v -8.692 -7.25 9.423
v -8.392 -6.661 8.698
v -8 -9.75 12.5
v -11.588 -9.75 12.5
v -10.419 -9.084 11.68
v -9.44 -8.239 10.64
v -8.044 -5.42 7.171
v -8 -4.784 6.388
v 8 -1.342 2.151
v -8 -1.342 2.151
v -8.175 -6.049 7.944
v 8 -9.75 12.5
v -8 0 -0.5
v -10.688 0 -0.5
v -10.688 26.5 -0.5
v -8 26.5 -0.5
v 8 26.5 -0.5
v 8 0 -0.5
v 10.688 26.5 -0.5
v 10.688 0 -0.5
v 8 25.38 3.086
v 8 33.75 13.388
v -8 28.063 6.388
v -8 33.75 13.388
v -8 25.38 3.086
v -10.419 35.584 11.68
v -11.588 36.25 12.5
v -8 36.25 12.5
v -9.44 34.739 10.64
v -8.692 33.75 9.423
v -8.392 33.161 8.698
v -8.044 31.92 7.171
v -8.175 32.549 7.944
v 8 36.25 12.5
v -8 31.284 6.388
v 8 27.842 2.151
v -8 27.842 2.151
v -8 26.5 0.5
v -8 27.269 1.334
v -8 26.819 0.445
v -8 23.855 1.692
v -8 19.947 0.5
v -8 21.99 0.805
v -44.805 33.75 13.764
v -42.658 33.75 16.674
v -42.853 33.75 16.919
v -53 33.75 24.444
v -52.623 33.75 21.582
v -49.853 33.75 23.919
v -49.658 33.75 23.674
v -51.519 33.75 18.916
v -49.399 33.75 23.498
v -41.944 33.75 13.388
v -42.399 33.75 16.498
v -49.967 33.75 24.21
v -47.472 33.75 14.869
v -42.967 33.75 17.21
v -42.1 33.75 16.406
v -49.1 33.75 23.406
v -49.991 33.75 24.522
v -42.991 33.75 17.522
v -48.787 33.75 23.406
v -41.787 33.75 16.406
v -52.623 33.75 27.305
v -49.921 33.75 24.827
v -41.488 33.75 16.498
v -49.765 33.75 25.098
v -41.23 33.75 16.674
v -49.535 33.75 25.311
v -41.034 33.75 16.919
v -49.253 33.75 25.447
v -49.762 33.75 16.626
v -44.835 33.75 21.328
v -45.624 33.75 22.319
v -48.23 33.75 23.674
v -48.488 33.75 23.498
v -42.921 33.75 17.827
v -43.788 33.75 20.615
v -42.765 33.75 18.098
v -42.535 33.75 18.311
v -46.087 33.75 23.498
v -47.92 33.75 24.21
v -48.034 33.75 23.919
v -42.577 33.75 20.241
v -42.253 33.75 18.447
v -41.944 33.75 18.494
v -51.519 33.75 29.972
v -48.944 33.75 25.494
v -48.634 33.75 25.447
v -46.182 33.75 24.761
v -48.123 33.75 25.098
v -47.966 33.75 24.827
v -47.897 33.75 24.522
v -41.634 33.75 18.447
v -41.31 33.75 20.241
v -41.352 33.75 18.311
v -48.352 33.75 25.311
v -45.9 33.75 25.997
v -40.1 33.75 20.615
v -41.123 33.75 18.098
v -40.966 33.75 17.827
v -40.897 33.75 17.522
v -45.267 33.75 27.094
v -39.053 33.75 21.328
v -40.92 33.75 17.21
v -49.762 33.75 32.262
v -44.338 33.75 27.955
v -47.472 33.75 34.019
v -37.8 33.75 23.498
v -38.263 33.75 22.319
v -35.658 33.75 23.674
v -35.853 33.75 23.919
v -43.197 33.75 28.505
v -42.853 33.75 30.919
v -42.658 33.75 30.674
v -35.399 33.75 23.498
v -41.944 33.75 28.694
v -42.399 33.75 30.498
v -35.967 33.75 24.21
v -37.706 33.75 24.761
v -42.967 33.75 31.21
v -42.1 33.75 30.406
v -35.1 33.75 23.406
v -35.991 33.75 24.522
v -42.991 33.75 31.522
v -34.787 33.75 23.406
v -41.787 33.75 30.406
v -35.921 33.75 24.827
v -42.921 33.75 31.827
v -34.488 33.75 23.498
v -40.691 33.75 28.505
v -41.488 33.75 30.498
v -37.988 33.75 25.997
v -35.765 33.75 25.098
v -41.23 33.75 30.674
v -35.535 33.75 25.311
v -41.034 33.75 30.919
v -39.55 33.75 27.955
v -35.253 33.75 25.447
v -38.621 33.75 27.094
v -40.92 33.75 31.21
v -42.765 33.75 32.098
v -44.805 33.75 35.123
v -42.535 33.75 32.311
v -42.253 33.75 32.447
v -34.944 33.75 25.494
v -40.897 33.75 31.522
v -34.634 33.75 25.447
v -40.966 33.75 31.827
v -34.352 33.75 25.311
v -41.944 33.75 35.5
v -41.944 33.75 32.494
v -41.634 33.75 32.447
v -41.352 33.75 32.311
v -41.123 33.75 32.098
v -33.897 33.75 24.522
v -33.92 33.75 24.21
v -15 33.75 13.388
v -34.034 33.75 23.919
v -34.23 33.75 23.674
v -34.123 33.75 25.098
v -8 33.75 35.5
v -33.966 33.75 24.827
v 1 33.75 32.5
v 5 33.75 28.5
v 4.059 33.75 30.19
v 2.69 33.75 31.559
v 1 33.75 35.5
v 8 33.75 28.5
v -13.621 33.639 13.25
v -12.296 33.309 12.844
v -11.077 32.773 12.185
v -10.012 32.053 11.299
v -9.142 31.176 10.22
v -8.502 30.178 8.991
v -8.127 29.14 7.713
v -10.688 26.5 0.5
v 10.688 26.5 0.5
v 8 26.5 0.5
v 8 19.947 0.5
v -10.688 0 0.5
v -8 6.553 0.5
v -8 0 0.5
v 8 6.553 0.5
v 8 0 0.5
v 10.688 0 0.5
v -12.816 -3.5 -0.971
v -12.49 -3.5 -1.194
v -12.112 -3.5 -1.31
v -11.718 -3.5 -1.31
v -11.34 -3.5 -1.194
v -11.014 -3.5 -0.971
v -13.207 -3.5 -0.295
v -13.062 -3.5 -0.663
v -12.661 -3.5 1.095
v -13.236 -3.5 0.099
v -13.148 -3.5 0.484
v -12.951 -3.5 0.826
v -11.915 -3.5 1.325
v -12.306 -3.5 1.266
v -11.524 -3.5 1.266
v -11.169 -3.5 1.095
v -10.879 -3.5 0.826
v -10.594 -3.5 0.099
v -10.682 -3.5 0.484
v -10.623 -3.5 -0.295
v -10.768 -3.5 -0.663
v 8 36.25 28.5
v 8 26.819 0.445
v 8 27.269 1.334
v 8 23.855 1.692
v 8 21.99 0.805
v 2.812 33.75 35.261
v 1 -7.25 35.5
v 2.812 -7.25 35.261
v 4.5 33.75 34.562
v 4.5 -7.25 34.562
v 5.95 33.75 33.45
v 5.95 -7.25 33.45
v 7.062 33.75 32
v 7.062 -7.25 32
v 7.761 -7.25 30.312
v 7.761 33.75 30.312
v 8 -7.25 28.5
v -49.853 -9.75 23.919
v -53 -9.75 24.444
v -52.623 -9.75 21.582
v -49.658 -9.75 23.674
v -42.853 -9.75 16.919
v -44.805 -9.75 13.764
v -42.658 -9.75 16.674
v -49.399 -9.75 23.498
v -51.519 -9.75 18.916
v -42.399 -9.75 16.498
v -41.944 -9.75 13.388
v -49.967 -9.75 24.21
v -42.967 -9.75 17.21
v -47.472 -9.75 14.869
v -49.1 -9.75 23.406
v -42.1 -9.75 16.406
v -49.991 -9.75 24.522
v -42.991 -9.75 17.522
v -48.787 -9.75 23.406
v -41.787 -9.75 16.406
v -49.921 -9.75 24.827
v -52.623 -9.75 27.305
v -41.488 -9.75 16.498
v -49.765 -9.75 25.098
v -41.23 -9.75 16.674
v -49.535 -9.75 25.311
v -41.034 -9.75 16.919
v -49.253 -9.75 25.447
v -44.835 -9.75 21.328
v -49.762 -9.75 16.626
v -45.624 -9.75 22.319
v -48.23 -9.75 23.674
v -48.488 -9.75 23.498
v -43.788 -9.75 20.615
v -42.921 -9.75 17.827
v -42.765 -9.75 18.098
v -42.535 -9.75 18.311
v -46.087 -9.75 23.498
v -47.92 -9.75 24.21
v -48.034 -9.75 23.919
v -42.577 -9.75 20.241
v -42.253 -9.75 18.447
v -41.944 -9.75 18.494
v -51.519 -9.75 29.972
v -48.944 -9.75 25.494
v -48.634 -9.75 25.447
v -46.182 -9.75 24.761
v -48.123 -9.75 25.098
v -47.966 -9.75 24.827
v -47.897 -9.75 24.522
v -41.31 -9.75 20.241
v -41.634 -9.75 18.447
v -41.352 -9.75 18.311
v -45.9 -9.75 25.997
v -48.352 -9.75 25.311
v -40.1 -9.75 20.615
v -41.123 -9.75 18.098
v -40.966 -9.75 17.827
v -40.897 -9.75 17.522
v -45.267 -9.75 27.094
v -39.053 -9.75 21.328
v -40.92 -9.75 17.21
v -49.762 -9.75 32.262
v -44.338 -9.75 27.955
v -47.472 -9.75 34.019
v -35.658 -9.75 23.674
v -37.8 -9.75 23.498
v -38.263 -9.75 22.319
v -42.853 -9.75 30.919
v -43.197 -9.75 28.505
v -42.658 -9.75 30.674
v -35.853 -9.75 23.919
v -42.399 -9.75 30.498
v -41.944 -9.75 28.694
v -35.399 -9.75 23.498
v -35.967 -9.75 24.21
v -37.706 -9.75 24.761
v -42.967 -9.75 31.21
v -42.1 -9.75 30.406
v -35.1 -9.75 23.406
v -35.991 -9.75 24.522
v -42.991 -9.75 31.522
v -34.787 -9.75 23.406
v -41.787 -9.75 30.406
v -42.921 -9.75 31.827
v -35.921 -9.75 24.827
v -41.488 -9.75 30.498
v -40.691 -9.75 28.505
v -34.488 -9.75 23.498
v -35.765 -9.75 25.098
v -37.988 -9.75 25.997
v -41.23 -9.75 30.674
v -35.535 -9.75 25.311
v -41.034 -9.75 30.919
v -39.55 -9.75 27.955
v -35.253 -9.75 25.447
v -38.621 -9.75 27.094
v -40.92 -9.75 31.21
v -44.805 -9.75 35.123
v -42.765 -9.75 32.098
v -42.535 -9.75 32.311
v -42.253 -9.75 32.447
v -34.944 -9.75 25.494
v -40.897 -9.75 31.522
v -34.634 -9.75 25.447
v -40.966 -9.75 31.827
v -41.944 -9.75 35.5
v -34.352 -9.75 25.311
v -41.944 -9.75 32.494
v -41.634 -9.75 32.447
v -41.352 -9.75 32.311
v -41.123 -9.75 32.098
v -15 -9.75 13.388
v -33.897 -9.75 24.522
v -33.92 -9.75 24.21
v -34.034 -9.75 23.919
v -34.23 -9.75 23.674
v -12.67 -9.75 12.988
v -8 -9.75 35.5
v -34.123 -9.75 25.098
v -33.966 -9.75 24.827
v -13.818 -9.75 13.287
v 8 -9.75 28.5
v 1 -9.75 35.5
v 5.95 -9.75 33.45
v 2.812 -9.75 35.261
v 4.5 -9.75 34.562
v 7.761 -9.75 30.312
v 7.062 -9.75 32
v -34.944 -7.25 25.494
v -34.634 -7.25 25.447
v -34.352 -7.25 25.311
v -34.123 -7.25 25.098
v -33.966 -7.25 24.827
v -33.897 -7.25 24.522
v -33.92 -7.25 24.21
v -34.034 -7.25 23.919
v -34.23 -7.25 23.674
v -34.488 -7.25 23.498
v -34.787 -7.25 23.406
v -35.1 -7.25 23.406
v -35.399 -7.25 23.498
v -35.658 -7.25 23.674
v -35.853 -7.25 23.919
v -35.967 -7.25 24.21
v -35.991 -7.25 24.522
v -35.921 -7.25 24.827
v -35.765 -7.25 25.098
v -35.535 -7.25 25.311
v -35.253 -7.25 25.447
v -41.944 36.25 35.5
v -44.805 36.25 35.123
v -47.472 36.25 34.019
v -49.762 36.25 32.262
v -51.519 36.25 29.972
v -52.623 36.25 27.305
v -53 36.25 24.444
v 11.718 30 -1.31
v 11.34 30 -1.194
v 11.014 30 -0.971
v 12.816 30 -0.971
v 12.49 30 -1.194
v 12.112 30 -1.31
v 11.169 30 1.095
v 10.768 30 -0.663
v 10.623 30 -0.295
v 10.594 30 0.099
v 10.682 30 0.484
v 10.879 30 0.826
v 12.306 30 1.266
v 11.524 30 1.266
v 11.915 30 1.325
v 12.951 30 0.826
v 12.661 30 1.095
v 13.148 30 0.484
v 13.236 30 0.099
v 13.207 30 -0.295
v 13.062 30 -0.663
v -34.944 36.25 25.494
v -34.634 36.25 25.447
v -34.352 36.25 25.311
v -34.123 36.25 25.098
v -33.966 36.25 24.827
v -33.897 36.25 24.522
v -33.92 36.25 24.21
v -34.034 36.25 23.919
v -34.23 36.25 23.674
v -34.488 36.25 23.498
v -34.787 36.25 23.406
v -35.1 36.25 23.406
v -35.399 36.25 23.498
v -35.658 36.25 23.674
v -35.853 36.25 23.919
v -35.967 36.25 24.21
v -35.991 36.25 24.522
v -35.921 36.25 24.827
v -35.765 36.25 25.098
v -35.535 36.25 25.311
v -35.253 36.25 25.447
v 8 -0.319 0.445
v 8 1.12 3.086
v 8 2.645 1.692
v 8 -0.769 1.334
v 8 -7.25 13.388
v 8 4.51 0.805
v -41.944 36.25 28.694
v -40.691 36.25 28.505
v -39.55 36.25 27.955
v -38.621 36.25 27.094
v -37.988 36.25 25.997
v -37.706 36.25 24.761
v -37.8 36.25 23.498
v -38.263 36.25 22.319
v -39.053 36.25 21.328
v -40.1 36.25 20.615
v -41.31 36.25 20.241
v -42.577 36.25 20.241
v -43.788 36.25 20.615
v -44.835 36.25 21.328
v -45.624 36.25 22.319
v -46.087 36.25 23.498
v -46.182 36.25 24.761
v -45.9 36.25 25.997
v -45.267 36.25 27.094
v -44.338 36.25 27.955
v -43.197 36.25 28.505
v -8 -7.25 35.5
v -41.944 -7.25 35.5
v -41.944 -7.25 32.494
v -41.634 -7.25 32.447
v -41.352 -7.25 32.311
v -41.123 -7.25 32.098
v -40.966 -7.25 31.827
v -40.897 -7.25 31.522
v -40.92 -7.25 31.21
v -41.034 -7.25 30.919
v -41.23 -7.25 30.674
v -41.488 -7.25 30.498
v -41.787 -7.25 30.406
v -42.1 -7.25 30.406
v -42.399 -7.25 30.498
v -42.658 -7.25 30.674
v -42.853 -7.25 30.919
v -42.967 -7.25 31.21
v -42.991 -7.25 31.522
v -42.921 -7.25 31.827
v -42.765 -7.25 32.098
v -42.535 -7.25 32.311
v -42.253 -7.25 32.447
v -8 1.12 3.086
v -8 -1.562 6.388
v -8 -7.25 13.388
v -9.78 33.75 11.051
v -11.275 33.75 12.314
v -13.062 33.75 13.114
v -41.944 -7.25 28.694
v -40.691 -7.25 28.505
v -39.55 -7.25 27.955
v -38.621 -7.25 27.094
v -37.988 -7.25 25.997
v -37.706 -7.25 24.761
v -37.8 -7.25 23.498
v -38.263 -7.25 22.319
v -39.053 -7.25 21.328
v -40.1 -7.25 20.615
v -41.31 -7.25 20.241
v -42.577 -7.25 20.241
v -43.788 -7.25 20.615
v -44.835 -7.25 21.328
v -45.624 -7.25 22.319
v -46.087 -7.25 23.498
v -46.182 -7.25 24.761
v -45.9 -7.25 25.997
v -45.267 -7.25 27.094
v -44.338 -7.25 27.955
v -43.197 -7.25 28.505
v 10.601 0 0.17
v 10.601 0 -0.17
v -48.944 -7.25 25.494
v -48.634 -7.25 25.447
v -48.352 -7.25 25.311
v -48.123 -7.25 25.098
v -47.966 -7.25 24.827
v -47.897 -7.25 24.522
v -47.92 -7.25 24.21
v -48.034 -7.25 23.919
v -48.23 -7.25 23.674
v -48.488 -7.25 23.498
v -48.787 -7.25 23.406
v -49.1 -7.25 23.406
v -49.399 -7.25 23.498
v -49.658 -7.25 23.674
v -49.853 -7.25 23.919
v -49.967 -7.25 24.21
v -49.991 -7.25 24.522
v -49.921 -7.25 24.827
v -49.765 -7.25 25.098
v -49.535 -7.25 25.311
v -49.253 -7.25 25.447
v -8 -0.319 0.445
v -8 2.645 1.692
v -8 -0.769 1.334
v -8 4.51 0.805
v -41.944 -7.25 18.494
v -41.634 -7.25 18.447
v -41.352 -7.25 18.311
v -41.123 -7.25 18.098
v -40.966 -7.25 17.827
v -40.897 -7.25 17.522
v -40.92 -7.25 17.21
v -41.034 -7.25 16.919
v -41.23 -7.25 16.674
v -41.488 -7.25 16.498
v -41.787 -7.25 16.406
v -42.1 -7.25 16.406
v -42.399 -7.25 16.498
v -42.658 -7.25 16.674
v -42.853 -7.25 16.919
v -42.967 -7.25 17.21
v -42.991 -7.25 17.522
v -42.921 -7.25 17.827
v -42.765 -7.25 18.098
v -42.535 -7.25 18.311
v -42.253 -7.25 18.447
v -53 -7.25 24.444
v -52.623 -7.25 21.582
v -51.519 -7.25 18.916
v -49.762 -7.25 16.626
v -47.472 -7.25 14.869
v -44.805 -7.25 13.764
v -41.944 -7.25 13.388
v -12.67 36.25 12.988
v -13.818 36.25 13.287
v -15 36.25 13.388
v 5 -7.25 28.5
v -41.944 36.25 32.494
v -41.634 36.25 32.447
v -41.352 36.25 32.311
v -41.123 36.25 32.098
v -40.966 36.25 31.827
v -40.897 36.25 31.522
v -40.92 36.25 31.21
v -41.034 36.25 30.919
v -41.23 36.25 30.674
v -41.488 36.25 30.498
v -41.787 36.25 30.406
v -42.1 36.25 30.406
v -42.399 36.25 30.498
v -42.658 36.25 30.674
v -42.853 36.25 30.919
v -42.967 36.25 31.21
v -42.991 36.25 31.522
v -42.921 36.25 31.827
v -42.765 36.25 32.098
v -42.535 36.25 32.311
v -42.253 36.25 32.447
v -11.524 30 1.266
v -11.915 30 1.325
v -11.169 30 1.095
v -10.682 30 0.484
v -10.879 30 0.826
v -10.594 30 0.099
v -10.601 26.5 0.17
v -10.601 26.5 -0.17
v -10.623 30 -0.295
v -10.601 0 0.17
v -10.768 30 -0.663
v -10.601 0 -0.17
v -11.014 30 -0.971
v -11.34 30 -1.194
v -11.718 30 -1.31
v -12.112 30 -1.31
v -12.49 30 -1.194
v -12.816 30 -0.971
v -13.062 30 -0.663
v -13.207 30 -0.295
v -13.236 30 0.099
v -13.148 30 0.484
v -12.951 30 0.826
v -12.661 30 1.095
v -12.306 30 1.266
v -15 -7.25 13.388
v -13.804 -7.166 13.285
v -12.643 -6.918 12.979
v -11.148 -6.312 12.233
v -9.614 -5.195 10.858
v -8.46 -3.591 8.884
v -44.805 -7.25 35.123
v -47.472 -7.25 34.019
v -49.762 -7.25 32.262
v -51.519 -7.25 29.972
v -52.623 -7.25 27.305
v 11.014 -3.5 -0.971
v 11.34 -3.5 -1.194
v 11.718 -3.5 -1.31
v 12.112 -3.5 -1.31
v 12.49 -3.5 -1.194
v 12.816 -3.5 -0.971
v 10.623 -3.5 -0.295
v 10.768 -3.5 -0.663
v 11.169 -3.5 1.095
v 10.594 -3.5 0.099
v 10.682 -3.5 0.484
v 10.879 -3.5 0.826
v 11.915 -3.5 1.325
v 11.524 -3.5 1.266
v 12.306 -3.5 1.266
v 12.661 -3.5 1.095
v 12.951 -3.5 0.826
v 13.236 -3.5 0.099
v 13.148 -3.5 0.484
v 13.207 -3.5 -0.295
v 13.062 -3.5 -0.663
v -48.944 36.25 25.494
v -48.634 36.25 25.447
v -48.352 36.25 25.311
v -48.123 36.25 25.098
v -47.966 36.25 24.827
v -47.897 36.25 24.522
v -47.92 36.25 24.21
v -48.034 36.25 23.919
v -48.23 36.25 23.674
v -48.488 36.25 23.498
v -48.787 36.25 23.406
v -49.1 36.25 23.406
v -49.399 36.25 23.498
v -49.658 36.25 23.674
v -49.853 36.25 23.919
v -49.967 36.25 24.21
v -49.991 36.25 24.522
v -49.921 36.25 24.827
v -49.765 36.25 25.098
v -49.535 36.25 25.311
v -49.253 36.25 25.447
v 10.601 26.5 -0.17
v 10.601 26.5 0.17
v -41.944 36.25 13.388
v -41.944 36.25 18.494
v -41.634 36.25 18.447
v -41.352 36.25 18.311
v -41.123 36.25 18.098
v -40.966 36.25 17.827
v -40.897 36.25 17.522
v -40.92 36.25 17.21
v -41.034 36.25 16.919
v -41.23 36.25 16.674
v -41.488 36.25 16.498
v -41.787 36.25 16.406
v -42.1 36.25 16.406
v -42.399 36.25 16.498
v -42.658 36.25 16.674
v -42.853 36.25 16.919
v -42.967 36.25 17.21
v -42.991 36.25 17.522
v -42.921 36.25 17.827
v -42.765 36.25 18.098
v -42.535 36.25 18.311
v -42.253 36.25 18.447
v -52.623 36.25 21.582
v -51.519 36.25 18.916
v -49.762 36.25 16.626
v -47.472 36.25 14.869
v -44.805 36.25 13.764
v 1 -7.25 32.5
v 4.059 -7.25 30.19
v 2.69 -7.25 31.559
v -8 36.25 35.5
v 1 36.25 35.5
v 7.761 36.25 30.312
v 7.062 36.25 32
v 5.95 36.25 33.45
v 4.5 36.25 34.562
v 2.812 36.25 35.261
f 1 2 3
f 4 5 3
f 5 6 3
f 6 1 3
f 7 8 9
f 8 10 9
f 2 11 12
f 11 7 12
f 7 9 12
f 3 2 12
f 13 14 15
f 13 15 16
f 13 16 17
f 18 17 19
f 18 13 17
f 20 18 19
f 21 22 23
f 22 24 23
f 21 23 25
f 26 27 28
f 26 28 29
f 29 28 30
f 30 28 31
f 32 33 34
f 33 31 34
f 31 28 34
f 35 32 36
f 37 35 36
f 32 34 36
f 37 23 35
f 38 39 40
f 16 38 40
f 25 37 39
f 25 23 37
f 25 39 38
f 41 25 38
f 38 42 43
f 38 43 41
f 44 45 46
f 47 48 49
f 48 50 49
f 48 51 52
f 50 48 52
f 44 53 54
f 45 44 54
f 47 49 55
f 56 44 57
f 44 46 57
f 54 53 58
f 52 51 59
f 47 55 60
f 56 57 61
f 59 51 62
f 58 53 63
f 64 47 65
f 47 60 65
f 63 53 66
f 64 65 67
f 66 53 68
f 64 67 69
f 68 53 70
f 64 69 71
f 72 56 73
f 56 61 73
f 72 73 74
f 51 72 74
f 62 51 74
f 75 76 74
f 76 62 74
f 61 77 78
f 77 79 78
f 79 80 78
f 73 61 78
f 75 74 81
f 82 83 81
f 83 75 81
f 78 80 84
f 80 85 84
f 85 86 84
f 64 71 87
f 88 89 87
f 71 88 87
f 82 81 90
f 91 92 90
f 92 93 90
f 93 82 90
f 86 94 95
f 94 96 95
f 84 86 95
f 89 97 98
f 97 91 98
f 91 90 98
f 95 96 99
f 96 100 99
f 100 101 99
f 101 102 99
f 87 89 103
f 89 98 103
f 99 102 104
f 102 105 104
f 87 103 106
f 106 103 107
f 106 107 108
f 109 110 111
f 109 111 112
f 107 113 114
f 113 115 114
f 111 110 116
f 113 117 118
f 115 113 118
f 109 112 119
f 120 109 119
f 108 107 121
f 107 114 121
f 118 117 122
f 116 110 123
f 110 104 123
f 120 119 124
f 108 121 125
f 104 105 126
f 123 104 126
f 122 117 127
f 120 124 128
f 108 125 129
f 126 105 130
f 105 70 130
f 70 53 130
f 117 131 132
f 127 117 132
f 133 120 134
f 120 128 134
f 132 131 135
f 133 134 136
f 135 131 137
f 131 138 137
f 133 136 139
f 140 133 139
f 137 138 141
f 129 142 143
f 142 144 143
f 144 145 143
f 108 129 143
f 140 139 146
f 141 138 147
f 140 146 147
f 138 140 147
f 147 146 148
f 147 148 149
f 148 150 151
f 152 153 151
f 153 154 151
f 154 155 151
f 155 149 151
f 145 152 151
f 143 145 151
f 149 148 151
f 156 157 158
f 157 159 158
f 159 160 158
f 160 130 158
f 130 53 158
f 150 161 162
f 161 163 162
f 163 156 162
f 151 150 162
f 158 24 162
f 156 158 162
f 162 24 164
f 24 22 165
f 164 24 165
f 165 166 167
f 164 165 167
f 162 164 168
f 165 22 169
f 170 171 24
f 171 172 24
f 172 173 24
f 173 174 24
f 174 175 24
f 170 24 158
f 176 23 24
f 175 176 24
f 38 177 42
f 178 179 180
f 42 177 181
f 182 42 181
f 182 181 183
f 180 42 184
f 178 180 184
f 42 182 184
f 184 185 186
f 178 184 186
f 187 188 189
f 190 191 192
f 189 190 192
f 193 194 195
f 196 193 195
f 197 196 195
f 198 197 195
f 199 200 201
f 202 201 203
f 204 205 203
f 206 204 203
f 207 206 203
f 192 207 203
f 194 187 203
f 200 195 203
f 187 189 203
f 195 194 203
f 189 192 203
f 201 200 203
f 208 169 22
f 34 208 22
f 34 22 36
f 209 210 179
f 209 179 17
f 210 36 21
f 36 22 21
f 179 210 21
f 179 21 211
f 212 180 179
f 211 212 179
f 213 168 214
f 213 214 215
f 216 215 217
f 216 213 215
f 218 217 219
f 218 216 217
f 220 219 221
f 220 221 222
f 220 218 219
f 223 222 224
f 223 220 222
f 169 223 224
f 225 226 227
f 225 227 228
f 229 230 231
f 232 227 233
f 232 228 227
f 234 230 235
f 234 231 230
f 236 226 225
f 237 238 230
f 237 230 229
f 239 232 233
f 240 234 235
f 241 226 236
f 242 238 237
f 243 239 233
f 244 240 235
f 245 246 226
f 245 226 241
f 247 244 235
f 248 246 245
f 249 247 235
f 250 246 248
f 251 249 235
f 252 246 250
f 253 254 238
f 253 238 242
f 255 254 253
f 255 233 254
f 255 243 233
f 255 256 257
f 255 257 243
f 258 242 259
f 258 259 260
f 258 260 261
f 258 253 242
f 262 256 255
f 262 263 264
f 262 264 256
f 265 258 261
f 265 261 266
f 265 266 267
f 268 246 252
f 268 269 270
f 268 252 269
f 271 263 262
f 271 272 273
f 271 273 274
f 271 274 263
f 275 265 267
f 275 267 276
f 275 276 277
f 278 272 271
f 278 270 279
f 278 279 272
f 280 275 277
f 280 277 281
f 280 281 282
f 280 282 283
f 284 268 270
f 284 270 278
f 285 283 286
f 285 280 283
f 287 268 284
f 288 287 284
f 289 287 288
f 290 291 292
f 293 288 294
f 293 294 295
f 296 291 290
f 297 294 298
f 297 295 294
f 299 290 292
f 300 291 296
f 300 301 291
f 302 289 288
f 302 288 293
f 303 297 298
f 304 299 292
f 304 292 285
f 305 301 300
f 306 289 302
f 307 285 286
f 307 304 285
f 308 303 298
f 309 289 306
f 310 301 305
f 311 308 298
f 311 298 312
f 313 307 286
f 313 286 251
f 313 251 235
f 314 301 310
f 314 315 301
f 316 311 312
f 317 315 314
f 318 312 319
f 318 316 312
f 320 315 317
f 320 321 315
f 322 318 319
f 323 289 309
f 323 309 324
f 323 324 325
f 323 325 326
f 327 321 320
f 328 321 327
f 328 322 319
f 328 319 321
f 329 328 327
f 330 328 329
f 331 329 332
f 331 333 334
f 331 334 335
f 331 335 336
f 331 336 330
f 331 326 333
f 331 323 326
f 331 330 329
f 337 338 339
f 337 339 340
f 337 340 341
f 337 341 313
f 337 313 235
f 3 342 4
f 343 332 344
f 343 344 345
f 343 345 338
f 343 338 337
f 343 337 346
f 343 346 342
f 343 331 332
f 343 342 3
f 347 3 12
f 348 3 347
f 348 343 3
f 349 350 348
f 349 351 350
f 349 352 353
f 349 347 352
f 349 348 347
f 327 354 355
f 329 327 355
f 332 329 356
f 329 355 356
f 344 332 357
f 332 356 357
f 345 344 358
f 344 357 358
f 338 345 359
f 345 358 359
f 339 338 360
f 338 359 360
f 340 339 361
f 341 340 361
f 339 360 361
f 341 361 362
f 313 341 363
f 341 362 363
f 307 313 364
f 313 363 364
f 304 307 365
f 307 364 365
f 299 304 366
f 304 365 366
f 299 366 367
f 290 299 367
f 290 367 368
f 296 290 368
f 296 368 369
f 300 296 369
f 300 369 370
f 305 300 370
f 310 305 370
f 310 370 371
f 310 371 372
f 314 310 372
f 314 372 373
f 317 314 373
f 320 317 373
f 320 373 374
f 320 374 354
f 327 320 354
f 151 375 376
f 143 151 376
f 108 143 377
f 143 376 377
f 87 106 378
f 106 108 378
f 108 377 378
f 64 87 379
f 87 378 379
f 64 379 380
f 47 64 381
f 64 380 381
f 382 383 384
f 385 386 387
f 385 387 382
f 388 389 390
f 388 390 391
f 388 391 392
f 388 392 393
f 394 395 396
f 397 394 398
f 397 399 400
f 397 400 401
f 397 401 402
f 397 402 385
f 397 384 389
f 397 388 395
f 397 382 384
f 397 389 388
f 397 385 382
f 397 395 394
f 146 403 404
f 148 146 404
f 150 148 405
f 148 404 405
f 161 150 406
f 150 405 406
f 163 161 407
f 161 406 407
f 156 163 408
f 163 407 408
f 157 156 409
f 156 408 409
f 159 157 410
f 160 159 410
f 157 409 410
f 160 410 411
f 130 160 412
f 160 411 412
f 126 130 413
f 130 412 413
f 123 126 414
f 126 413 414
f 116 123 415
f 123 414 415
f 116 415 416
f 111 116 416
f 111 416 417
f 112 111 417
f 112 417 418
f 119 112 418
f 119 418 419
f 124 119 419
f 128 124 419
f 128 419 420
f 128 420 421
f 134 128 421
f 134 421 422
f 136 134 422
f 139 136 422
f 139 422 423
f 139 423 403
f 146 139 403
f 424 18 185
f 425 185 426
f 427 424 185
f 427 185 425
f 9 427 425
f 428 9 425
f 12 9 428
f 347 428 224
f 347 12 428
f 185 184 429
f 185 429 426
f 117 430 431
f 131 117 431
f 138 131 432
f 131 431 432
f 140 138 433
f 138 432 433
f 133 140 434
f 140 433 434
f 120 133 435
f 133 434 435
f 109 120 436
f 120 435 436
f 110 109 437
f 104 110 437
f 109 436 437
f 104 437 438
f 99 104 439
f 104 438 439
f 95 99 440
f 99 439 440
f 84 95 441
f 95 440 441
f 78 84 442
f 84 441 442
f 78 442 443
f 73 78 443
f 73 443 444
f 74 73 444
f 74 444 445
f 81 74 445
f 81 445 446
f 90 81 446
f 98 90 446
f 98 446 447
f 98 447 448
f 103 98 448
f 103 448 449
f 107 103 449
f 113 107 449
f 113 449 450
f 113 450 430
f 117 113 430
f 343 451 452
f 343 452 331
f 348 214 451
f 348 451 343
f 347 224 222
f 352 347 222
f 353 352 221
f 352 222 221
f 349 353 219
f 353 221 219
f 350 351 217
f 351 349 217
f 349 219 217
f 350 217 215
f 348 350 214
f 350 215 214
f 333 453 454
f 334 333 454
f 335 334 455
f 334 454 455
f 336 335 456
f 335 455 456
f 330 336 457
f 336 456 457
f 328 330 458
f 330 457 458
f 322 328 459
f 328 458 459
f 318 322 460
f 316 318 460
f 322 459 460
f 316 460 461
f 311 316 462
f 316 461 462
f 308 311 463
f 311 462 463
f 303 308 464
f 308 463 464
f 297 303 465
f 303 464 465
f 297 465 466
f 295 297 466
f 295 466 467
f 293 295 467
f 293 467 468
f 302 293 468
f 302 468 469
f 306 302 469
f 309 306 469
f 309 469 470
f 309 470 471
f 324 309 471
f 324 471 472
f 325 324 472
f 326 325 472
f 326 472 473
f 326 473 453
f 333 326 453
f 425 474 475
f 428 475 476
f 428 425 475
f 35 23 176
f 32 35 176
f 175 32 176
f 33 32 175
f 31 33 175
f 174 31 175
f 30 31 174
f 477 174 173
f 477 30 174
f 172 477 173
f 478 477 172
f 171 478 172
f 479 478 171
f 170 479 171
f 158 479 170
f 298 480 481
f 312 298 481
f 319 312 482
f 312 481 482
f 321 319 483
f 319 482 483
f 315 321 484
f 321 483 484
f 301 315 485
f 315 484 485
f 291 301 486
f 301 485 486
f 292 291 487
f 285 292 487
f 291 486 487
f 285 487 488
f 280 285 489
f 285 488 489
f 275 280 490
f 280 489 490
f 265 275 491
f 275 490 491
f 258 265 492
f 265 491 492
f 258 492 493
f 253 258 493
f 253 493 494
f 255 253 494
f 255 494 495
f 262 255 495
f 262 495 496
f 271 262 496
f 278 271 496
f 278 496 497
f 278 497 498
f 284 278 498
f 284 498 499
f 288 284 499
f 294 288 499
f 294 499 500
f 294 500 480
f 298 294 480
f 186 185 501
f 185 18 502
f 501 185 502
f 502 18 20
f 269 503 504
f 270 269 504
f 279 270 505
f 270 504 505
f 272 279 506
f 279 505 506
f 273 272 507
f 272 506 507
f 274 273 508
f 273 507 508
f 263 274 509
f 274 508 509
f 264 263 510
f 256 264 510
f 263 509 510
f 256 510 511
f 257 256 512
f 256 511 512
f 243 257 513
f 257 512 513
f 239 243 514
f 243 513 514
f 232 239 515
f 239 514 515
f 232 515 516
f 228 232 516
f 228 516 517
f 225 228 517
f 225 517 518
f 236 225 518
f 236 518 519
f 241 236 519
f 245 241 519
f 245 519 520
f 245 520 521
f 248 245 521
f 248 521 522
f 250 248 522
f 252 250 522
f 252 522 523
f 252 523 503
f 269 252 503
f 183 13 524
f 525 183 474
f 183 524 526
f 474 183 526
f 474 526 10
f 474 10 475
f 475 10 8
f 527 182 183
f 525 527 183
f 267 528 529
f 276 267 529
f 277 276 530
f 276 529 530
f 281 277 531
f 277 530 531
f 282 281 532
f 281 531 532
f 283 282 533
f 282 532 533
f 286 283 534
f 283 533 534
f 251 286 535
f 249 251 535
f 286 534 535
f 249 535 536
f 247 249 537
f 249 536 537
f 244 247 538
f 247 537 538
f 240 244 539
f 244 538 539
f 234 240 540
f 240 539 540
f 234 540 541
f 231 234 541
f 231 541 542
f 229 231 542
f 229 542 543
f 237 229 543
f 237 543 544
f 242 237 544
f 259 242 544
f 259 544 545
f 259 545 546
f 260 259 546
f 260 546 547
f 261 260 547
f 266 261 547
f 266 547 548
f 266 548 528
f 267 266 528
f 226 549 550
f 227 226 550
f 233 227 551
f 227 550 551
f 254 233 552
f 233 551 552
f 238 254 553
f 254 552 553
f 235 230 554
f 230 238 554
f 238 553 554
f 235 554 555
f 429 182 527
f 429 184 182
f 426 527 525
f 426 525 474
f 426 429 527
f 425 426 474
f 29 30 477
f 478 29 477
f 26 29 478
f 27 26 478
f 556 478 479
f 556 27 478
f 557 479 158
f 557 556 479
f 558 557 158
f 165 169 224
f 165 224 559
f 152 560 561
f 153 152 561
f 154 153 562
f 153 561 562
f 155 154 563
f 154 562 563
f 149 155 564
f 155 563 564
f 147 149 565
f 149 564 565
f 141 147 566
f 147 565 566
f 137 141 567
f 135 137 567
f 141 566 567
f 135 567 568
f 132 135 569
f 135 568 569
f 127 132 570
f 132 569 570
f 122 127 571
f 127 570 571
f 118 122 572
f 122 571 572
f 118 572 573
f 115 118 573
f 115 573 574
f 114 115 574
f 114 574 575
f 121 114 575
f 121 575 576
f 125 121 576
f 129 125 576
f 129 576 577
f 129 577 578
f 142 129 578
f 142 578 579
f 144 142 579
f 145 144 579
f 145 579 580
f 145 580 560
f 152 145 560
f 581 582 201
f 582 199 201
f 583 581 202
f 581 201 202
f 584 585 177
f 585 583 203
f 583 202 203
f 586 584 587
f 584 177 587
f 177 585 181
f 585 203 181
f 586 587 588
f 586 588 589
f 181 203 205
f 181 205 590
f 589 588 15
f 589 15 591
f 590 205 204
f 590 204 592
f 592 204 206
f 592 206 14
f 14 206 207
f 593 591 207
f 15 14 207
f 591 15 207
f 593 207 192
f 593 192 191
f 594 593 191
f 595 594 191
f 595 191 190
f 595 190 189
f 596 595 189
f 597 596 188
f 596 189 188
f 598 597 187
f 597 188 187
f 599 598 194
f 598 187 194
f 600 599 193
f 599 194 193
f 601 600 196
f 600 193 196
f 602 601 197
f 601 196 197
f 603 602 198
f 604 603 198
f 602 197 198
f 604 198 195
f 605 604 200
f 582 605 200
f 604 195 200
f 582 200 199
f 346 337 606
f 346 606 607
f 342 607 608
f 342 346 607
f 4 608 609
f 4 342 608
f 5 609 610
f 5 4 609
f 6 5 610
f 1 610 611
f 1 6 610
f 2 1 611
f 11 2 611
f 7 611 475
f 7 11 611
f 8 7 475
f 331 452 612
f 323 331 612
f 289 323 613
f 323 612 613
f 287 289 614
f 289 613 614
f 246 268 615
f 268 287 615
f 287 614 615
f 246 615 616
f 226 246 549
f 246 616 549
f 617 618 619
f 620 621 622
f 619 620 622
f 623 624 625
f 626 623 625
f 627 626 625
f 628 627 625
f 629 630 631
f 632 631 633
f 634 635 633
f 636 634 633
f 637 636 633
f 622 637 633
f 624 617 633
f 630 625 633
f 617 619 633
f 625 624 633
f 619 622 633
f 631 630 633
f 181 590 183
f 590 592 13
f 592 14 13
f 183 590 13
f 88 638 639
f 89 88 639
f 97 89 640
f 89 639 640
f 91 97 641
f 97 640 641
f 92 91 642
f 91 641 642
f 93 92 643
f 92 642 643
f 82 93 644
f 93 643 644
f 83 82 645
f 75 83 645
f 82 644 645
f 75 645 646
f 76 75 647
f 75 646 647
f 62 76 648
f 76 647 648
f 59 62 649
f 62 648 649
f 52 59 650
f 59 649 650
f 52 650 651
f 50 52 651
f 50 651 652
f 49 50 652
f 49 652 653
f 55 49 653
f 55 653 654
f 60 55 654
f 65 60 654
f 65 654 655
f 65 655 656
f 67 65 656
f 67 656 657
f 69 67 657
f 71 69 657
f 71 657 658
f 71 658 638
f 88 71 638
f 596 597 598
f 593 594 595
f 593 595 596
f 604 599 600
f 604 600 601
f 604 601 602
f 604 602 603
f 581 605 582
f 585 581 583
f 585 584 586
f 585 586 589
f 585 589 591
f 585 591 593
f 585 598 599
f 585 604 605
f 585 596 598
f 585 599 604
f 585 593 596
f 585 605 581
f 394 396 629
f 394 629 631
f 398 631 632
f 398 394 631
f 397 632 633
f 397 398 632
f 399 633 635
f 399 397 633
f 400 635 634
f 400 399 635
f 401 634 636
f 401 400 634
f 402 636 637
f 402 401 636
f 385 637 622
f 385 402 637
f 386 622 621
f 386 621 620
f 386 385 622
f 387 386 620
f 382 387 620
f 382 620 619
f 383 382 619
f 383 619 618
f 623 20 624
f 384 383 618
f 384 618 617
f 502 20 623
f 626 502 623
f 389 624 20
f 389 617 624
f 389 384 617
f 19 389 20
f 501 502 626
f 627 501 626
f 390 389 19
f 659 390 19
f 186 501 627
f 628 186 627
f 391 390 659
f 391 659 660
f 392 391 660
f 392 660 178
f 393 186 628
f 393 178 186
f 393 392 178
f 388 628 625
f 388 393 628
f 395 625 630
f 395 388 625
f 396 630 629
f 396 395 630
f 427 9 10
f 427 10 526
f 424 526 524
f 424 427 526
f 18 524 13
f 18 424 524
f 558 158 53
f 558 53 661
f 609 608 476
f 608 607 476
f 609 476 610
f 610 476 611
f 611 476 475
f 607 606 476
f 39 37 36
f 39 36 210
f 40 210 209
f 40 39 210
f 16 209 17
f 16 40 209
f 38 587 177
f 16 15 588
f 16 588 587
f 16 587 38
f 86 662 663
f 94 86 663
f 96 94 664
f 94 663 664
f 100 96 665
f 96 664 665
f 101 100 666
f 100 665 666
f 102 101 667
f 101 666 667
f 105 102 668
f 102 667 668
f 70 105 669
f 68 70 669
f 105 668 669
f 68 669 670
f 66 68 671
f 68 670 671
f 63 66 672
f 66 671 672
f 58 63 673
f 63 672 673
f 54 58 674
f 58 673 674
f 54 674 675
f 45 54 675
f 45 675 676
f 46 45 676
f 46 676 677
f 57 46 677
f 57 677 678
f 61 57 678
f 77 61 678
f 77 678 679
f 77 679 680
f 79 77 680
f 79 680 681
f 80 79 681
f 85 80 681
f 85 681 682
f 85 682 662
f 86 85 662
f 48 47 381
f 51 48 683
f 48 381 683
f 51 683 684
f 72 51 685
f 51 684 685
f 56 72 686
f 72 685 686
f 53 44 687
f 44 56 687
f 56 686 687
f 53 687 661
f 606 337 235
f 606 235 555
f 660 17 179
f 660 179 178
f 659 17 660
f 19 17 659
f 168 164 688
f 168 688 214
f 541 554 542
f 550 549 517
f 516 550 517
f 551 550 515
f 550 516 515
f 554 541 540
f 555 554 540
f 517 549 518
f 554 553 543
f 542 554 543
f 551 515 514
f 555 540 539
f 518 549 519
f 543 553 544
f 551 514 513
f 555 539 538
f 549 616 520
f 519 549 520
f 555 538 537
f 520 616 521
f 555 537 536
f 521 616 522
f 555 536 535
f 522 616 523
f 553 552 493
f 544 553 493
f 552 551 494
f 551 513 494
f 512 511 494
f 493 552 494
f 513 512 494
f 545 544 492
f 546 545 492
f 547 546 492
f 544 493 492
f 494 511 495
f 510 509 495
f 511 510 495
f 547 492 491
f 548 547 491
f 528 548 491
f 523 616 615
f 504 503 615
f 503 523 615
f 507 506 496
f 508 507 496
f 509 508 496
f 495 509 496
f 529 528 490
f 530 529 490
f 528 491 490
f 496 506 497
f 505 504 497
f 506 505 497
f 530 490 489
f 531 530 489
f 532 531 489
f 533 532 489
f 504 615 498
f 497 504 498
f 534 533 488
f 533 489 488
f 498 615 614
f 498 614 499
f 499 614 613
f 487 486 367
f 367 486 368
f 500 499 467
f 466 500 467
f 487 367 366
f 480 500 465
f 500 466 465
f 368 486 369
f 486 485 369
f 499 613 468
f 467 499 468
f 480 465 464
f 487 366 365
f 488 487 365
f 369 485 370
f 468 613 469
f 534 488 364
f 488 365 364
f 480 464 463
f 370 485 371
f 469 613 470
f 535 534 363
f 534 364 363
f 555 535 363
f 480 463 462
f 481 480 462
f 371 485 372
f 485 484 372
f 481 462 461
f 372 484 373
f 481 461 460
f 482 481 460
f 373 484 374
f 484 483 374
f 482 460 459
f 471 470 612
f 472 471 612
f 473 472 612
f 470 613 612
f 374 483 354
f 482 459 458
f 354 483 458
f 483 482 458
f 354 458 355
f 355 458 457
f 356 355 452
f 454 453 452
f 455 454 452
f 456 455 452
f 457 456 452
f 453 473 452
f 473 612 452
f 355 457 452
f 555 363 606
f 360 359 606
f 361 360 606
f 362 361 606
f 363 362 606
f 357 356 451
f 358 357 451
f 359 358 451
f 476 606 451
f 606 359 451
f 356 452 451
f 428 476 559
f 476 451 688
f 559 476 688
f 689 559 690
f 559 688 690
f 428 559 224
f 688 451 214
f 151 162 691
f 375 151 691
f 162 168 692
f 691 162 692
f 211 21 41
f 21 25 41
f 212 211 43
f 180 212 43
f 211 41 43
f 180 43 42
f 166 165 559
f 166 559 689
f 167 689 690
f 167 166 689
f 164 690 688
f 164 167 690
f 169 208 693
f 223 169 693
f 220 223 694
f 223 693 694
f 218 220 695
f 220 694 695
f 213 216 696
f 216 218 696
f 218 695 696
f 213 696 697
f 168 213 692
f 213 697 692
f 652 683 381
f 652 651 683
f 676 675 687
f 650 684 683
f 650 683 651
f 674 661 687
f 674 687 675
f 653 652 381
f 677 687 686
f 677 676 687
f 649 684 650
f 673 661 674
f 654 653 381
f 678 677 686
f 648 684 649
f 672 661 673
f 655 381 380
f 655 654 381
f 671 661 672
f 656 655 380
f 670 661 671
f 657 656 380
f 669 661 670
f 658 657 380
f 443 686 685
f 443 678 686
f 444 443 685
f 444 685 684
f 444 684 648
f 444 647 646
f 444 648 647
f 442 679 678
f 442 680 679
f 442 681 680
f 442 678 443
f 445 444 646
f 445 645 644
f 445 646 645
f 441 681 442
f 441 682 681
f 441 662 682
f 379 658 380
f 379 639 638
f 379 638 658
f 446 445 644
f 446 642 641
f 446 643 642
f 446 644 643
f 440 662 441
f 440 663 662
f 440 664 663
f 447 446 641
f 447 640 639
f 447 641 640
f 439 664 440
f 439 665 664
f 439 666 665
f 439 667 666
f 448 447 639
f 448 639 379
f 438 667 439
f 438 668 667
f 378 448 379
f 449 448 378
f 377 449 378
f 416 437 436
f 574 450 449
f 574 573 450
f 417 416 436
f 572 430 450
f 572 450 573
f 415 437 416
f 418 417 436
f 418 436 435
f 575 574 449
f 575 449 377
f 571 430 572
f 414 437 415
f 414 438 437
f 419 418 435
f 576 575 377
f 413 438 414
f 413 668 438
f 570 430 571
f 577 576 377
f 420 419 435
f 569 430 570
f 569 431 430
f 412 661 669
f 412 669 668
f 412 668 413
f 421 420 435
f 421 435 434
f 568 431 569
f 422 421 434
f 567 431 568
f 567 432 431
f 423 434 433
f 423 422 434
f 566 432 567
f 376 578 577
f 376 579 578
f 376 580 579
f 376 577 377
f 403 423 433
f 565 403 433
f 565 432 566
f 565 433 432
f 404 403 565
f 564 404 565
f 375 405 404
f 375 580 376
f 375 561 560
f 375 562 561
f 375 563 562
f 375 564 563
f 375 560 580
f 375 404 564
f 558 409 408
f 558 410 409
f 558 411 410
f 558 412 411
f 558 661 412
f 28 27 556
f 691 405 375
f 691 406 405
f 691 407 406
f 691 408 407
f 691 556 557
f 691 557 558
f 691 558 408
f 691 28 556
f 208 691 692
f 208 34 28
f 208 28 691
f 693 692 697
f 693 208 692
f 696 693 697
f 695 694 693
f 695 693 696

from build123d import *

# Parameters (mm, degrees)
SKETCH1_W           = 23.83
SKETCH1_H           = 1
BOSS_EXTRUDE1_DEPTH = 26.5
SKETCH2_R           = 1.325
BOSS_EXTRUDE2_DEPTH = 16.75
BOSS_EXTRUDE4_DEPTH = 8
SKETCH5_W           = 22.112398437
SKETCH5_H           = 2.5
BOSS_EXTRUDE5_DEPTH = 45
SKETCH6_R           = 4.25
SKETCH6_R_2         = 1.05
CUT_EXTRUDE1_DEPTH  = 79.646360374
FILLET1_R           = 7
FILLET2_R           = 7
FILLET3_R           = 7
BOSS_EXTRUDE6_START = 41
BOSS_EXTRUDE6_DEPTH = 41


with BuildPart() as part:
    # Sketch1 → Boss-Extrude1 (new body)
    with BuildSketch(Plane(origin=(0, 0, 0), x_dir=(1, 0, 0), z_dir=(0, 1, 0))):
        Rectangle(SKETCH1_W, SKETCH1_H)
    extrude(amount=BOSS_EXTRUDE1_DEPTH)

    # Sketch2 → Boss-Extrude2 (add, symmetric)
    with BuildSketch(Plane(origin=(0, 13.25, 0), x_dir=(1, 0, 0), z_dir=(0, 1, 0))):
        with Locations(Location((-11.915, 0, 0), (0, 0, 270))):
            Circle(SKETCH2_R)
        with Locations(Location((11.915, 0, 0), (0, 0, 270))):
            Circle(SKETCH2_R)
    extrude(amount=BOSS_EXTRUDE2_DEPTH, both=True)

    # Sketch4 → Boss-Extrude4 (add, symmetric)
    with BuildSketch(Plane(origin=(0, 0, 0), x_dir=(0, 0, -1), z_dir=(1, 0, 0))):
        Polygon((-0.5, 23.27882373), (-0.5, 26.5), (-12.5, 36.25), (-35.5, 36.25), (-35.5, 33.75), (-13.387601563, 33.75), align=None)
        Polygon((-0.5, 0), (-0.5, 3.22117627), (-13.387601563, -7.25), (-35.5, -7.25), (-35.5, -9.75), (-12.5, -9.75), align=None)
    extrude(amount=BOSS_EXTRUDE4_DEPTH, both=True)

    # Sketch5 → Boss-Extrude5 (add)
    with BuildSketch(Plane.ZY.offset(8)):
        with Locations((24.443800782, 35)):
            Rectangle(SKETCH5_W, SKETCH5_H)
        with Locations((24.443800782, -8.5)):
            Rectangle(SKETCH5_W, SKETCH5_H)
    extrude(amount=BOSS_EXTRUDE5_DEPTH)

    # Sketch6 → Cut-Extrude1 (cut, through all)
    with BuildSketch(Plane(origin=(0, 36.25, 0), x_dir=(1, 0, 0), z_dir=(0, 1, 0))):
        with Locations(Location((-41.943800782, -24.443800782, 0), (0, 0, 270))):
            Circle(SKETCH6_R)
        with Locations(Location((-48.943800782, -24.443800782, 0), (0, 0, 270))):
            Circle(SKETCH6_R_2)
        with Locations(Location((-41.943800782, -17.443800782, 0), (0, 0, 270))):
            Circle(SKETCH6_R_2)
        with Locations(Location((-34.943800782, -24.443800782, 0), (0, 0, 270))):
            Circle(SKETCH6_R_2)
        with Locations(Location((-41.943800782, -31.443800782, 0), (0, 0, 270))):
            Circle(SKETCH6_R_2)
        with BuildLine():
            ThreePointArc((-53, -24.443800782), (-49.761714223, -16.62588734), (-41.943800782, -13.387601563))
            Line((-41.943800782, -13.387601563), (-53, -13.387601563))
            Line((-53, -13.387601563), (-53, -24.443800782))
        make_face()
        with BuildLine():
            ThreePointArc((-41.943800782, -35.5), (-49.761714223, -32.261714223), (-53, -24.443800782))
            Line((-53, -24.443800782), (-53, -35.5))
            Line((-53, -35.5), (-41.943800782, -35.5))
        make_face()
    extrude(amount=-CUT_EXTRUDE1_DEPTH, mode=Mode.SUBTRACT)

    # Fillet1
    # the kernel refuses this fillet: 7 mm, written as the material it adds along each edge
    with BuildSketch(Plane(origin=(-8, -9.75, 13.387601563), x_dir=(-1, 0, 0), z_dir=(0, 1, 0))) as fillet1_piece_1_section:
        with BuildLine():
            CenterArc((FILLET1_R, -FILLET1_R), FILLET1_R, 90, 90)
            Line((0, -FILLET1_R), (0, 0))
            Line((0, 0), (FILLET1_R, 0))
        make_face()
    fillet1_piece_1 = extrude(amount=2.5, mode=Mode.PRIVATE)
    fillet1_piece_1 = split(fillet1_piece_1, bisect_by=Plane(origin=(-9.983413871, -9.198966646, 11.821805103), z_dir=(0, 0.7761140001162655, 0.6305926250944658)), keep=Keep.TOP, mode=Mode.PRIVATE)
    fillet1_piece_1 = split(fillet1_piece_1, bisect_by=Plane(origin=(-9.983413871, -7.258681646, 13.398286665), z_dir=(0, -0.7761140001162655, -0.6305926250944658)), keep=Keep.TOP, mode=Mode.PRIVATE)
    add(fillet1_piece_1)
    with BuildSketch(Plane(origin=(-8, -9.75, 13.387601563), x_dir=(-1, 0, 0), z_dir=(0, 1, 0))) as fillet1_piece_2_section:
        with BuildLine():
            CenterArc((FILLET1_R, -FILLET1_R), FILLET1_R, 90, 90)
            Line((0, -FILLET1_R), (0, 0))
            Line((0, 0), (FILLET1_R, 0))
        make_face()
    fillet1_piece_2 = extrude(amount=20, mode=Mode.PRIVATE)
    fillet1_piece_2 = split(fillet1_piece_2, bisect_by=Plane(origin=(-8.790191319, -7.296205837, 9.479945645), z_dir=(0, 0.7761140001162655, 0.6305926250944658)), keep=Keep.TOP, mode=Mode.PRIVATE)
    fillet1_piece_2 = split(fillet1_piece_2, bisect_by=Plane(origin=(-8.790191319, -7.25, 10.538925052), z_dir=(0, 1, 0)), keep=Keep.TOP, mode=Mode.PRIVATE)
    fillet1_piece_2 = split(fillet1_piece_2, bisect_by=Plane(origin=(-8.790191319, -5.355920836, 11.056427208), z_dir=(0, -0.7761140001162655, -0.6305926250944658)), keep=Keep.TOP, mode=Mode.PRIVATE)
    add(fillet1_piece_2)
    with BuildSketch(Plane(origin=(-8, 36.25, 13.387601563), x_dir=(0, 0, -1), z_dir=(0, -1, 0))) as fillet1_piece_3_section:
        with BuildLine():
            CenterArc((FILLET1_R, -FILLET1_R), FILLET1_R, 90, 90)
            Line((0, -FILLET1_R), (0, 0))
            Line((0, 0), (FILLET1_R, 0))
        make_face()
    fillet1_piece_3 = extrude(amount=2.5, mode=Mode.PRIVATE)
    fillet1_piece_3 = split(fillet1_piece_3, bisect_by=Plane(origin=(-9.983413871, 35.698966646, 11.821805103), z_dir=(0, -0.7761140001162655, 0.6305926250944659)), keep=Keep.TOP, mode=Mode.PRIVATE)
    fillet1_piece_3 = split(fillet1_piece_3, bisect_by=Plane(origin=(-9.983413871, 33.758681646, 13.398286666), z_dir=(0, 0.7761140001162657, -0.6305926250944655)), keep=Keep.TOP, mode=Mode.PRIVATE)
    add(fillet1_piece_3)
    with BuildSketch(Plane(origin=(-8, 36.25, 13.387601563), x_dir=(0, 0, -1), z_dir=(0, -1, 0))) as fillet1_piece_4_section:
        with BuildLine():
            CenterArc((FILLET1_R, -FILLET1_R), FILLET1_R, 90, 90)
            Line((0, -FILLET1_R), (0, 0))
            Line((0, 0), (FILLET1_R, 0))
        make_face()
    fillet1_piece_4 = extrude(amount=20, mode=Mode.PRIVATE)
    fillet1_piece_4 = split(fillet1_piece_4, bisect_by=Plane(origin=(-8.790191317, 33.796205836, 9.479945645), z_dir=(0, -0.7761140001162655, 0.6305926250944659)), keep=Keep.TOP, mode=Mode.PRIVATE)
    fillet1_piece_4 = split(fillet1_piece_4, bisect_by=Plane(origin=(-8.790191317, 31.855920836, 11.056427207), z_dir=(0, 0.7761140001162657, -0.6305926250944655)), keep=Keep.TOP, mode=Mode.PRIVATE)
    fillet1_piece_4 = split(fillet1_piece_4, bisect_by=Plane(origin=(-8.790191317, 33.75, 10.538925051), z_dir=(0, -1, 0)), keep=Keep.TOP, mode=Mode.PRIVATE)
    add(fillet1_piece_4)
    # the kernel refuses this fillet: 7 mm, written as the material it takes off along each edge
    with BuildSketch(Plane(origin=(8, 10.25, 35.5), x_dir=(0, 0, -1), z_dir=(0, -1, 0))) as fillet1_2_piece_1:
        with BuildLine():
            CenterArc((FILLET1_R, -FILLET1_R), FILLET1_R, 90, 90)
            Line((0, -FILLET1_R), (0, 0))
            Line((0, 0), (FILLET1_R, 0))
        make_face()
    extrude(amount=37.5, mode=Mode.SUBTRACT)
    with BuildSketch(Plane(origin=(8, 53.75, 35.5), x_dir=(-1, 0, 0), z_dir=(0, -1, 0))) as fillet1_2_piece_2:
        with BuildLine():
            CenterArc((FILLET1_R, FILLET1_R), FILLET1_R, 180, 90)
            Line((0, FILLET1_R), (0, 0))
            Line((0, 0), (FILLET1_R, 0))
        make_face()
    extrude(amount=37.5, mode=Mode.SUBTRACT)

    # Fillet2
    fillet2_edges = [part.edges().sort_by_distance(p)[0] for p in [
        (0, 23.27882373, 0.5),
        (0, 3.22117627, 0.5),
    ]]
    fillet(fillet2_edges, radius=FILLET2_R)

    # Fillet3
    # the kernel refuses this fillet: 7 mm, written as the material it adds along each edge
    with BuildSketch(Plane(origin=(-8, 26.5, 0.5), x_dir=(0, 0.6305926250951525, 0.7761140001157076), z_dir=(1, 0, 0))) as fillet3_piece_1:
        with BuildLine():
            CenterArc((2.127444109, -7), FILLET3_R, 90, 24.506345334)
            Line((-0.776114, -0.630592625), (0, 0))
            Line((0, 0), (2.127444109, 0))
        make_face()
    extrude(amount=16)
    with BuildSketch(Plane(origin=(8, 0, 0.5), x_dir=(0, 0, -1), z_dir=(-1, 0, 0))) as fillet3_piece_2:
        with BuildLine():
            CenterArc((2.763009218, 6.774348566), FILLET3_R, 230.906141114, 24.506345334)
            Line((-1.651139157, 1.341550565), (0, 0))
            Line((0, 0), (1, 0))
        make_face()
    extrude(amount=16)

    # Sketch8 → Boss-Extrude6 (add)
    with BuildSketch(Plane(origin=(0, -7.25, 0), x_dir=(1, 0, 0), z_dir=(0, 1, 0)).offset(BOSS_EXTRUDE6_START)):
        with BuildLine():
            ThreePointArc((1, -35.5), (5.949747468, -33.449747468), (8, -28.5))
            Line((8, -28.5), (5, -28.5))
            ThreePointArc((5, -28.5), (3.422054899, -30.922054899), (1, -32.5))
            Line((1, -32.5), (1, -35.5))
        make_face()
    extrude(amount=-BOSS_EXTRUDE6_DEPTH)


solid = part.part
